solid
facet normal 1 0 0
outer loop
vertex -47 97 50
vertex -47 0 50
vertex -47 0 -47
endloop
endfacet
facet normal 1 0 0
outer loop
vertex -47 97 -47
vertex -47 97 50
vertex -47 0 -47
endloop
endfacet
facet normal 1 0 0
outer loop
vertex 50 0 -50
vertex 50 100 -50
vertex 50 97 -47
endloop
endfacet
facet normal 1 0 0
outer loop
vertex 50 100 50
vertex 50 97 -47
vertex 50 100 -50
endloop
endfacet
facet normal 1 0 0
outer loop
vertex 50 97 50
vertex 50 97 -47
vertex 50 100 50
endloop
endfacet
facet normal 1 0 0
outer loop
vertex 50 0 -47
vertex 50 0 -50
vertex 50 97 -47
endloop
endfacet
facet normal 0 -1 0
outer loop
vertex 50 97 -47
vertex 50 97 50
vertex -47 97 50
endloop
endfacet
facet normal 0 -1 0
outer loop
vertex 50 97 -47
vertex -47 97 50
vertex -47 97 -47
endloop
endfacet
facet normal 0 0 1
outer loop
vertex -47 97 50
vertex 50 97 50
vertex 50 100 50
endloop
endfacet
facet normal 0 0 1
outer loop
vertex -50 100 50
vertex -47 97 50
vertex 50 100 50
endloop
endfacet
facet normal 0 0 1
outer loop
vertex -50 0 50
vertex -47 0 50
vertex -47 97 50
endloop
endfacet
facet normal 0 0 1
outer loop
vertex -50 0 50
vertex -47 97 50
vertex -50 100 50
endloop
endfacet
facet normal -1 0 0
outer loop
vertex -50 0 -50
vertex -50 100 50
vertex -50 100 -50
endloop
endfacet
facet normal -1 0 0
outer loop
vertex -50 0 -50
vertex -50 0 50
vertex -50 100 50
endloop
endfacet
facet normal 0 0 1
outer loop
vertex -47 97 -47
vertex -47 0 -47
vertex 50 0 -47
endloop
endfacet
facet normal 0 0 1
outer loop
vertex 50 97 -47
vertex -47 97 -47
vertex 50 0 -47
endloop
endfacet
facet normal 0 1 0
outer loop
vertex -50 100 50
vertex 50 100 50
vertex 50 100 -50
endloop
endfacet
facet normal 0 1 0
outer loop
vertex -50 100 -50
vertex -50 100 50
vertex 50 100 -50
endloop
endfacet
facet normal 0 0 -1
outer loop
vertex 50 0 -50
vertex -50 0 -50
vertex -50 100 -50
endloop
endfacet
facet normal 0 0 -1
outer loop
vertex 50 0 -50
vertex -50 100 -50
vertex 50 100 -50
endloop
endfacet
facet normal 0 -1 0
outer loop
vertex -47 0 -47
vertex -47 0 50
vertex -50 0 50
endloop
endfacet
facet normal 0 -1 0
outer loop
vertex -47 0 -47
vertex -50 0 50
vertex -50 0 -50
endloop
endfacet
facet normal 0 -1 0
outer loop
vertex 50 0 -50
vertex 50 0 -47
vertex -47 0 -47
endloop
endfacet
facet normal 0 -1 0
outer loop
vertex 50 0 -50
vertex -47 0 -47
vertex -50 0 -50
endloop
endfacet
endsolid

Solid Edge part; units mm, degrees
sketch "Sketch1" plane through (0, 0, 0) normal (0, -1, 0) x (1, 0, 0)
  line L0 (50, 50) -> (-50, 50)
  line L1 (-50, 50) -> (-50, -50)
  line L2 (-50, -50) -> (50, -50)
  line L3 (50, -50) -> (50, 50)
  dimension "D1" = 100
  dimension "D2" = 100
extrude "Protrusion1" add sketch "Sketch1" against normal blind 100
shell "Thinwall1" thickness 3 removed faces 3 at (-32.3333, 0, 34.3333) at (34.3333, 82.3333, 50) at (50, 82.3333, -34.3333)
